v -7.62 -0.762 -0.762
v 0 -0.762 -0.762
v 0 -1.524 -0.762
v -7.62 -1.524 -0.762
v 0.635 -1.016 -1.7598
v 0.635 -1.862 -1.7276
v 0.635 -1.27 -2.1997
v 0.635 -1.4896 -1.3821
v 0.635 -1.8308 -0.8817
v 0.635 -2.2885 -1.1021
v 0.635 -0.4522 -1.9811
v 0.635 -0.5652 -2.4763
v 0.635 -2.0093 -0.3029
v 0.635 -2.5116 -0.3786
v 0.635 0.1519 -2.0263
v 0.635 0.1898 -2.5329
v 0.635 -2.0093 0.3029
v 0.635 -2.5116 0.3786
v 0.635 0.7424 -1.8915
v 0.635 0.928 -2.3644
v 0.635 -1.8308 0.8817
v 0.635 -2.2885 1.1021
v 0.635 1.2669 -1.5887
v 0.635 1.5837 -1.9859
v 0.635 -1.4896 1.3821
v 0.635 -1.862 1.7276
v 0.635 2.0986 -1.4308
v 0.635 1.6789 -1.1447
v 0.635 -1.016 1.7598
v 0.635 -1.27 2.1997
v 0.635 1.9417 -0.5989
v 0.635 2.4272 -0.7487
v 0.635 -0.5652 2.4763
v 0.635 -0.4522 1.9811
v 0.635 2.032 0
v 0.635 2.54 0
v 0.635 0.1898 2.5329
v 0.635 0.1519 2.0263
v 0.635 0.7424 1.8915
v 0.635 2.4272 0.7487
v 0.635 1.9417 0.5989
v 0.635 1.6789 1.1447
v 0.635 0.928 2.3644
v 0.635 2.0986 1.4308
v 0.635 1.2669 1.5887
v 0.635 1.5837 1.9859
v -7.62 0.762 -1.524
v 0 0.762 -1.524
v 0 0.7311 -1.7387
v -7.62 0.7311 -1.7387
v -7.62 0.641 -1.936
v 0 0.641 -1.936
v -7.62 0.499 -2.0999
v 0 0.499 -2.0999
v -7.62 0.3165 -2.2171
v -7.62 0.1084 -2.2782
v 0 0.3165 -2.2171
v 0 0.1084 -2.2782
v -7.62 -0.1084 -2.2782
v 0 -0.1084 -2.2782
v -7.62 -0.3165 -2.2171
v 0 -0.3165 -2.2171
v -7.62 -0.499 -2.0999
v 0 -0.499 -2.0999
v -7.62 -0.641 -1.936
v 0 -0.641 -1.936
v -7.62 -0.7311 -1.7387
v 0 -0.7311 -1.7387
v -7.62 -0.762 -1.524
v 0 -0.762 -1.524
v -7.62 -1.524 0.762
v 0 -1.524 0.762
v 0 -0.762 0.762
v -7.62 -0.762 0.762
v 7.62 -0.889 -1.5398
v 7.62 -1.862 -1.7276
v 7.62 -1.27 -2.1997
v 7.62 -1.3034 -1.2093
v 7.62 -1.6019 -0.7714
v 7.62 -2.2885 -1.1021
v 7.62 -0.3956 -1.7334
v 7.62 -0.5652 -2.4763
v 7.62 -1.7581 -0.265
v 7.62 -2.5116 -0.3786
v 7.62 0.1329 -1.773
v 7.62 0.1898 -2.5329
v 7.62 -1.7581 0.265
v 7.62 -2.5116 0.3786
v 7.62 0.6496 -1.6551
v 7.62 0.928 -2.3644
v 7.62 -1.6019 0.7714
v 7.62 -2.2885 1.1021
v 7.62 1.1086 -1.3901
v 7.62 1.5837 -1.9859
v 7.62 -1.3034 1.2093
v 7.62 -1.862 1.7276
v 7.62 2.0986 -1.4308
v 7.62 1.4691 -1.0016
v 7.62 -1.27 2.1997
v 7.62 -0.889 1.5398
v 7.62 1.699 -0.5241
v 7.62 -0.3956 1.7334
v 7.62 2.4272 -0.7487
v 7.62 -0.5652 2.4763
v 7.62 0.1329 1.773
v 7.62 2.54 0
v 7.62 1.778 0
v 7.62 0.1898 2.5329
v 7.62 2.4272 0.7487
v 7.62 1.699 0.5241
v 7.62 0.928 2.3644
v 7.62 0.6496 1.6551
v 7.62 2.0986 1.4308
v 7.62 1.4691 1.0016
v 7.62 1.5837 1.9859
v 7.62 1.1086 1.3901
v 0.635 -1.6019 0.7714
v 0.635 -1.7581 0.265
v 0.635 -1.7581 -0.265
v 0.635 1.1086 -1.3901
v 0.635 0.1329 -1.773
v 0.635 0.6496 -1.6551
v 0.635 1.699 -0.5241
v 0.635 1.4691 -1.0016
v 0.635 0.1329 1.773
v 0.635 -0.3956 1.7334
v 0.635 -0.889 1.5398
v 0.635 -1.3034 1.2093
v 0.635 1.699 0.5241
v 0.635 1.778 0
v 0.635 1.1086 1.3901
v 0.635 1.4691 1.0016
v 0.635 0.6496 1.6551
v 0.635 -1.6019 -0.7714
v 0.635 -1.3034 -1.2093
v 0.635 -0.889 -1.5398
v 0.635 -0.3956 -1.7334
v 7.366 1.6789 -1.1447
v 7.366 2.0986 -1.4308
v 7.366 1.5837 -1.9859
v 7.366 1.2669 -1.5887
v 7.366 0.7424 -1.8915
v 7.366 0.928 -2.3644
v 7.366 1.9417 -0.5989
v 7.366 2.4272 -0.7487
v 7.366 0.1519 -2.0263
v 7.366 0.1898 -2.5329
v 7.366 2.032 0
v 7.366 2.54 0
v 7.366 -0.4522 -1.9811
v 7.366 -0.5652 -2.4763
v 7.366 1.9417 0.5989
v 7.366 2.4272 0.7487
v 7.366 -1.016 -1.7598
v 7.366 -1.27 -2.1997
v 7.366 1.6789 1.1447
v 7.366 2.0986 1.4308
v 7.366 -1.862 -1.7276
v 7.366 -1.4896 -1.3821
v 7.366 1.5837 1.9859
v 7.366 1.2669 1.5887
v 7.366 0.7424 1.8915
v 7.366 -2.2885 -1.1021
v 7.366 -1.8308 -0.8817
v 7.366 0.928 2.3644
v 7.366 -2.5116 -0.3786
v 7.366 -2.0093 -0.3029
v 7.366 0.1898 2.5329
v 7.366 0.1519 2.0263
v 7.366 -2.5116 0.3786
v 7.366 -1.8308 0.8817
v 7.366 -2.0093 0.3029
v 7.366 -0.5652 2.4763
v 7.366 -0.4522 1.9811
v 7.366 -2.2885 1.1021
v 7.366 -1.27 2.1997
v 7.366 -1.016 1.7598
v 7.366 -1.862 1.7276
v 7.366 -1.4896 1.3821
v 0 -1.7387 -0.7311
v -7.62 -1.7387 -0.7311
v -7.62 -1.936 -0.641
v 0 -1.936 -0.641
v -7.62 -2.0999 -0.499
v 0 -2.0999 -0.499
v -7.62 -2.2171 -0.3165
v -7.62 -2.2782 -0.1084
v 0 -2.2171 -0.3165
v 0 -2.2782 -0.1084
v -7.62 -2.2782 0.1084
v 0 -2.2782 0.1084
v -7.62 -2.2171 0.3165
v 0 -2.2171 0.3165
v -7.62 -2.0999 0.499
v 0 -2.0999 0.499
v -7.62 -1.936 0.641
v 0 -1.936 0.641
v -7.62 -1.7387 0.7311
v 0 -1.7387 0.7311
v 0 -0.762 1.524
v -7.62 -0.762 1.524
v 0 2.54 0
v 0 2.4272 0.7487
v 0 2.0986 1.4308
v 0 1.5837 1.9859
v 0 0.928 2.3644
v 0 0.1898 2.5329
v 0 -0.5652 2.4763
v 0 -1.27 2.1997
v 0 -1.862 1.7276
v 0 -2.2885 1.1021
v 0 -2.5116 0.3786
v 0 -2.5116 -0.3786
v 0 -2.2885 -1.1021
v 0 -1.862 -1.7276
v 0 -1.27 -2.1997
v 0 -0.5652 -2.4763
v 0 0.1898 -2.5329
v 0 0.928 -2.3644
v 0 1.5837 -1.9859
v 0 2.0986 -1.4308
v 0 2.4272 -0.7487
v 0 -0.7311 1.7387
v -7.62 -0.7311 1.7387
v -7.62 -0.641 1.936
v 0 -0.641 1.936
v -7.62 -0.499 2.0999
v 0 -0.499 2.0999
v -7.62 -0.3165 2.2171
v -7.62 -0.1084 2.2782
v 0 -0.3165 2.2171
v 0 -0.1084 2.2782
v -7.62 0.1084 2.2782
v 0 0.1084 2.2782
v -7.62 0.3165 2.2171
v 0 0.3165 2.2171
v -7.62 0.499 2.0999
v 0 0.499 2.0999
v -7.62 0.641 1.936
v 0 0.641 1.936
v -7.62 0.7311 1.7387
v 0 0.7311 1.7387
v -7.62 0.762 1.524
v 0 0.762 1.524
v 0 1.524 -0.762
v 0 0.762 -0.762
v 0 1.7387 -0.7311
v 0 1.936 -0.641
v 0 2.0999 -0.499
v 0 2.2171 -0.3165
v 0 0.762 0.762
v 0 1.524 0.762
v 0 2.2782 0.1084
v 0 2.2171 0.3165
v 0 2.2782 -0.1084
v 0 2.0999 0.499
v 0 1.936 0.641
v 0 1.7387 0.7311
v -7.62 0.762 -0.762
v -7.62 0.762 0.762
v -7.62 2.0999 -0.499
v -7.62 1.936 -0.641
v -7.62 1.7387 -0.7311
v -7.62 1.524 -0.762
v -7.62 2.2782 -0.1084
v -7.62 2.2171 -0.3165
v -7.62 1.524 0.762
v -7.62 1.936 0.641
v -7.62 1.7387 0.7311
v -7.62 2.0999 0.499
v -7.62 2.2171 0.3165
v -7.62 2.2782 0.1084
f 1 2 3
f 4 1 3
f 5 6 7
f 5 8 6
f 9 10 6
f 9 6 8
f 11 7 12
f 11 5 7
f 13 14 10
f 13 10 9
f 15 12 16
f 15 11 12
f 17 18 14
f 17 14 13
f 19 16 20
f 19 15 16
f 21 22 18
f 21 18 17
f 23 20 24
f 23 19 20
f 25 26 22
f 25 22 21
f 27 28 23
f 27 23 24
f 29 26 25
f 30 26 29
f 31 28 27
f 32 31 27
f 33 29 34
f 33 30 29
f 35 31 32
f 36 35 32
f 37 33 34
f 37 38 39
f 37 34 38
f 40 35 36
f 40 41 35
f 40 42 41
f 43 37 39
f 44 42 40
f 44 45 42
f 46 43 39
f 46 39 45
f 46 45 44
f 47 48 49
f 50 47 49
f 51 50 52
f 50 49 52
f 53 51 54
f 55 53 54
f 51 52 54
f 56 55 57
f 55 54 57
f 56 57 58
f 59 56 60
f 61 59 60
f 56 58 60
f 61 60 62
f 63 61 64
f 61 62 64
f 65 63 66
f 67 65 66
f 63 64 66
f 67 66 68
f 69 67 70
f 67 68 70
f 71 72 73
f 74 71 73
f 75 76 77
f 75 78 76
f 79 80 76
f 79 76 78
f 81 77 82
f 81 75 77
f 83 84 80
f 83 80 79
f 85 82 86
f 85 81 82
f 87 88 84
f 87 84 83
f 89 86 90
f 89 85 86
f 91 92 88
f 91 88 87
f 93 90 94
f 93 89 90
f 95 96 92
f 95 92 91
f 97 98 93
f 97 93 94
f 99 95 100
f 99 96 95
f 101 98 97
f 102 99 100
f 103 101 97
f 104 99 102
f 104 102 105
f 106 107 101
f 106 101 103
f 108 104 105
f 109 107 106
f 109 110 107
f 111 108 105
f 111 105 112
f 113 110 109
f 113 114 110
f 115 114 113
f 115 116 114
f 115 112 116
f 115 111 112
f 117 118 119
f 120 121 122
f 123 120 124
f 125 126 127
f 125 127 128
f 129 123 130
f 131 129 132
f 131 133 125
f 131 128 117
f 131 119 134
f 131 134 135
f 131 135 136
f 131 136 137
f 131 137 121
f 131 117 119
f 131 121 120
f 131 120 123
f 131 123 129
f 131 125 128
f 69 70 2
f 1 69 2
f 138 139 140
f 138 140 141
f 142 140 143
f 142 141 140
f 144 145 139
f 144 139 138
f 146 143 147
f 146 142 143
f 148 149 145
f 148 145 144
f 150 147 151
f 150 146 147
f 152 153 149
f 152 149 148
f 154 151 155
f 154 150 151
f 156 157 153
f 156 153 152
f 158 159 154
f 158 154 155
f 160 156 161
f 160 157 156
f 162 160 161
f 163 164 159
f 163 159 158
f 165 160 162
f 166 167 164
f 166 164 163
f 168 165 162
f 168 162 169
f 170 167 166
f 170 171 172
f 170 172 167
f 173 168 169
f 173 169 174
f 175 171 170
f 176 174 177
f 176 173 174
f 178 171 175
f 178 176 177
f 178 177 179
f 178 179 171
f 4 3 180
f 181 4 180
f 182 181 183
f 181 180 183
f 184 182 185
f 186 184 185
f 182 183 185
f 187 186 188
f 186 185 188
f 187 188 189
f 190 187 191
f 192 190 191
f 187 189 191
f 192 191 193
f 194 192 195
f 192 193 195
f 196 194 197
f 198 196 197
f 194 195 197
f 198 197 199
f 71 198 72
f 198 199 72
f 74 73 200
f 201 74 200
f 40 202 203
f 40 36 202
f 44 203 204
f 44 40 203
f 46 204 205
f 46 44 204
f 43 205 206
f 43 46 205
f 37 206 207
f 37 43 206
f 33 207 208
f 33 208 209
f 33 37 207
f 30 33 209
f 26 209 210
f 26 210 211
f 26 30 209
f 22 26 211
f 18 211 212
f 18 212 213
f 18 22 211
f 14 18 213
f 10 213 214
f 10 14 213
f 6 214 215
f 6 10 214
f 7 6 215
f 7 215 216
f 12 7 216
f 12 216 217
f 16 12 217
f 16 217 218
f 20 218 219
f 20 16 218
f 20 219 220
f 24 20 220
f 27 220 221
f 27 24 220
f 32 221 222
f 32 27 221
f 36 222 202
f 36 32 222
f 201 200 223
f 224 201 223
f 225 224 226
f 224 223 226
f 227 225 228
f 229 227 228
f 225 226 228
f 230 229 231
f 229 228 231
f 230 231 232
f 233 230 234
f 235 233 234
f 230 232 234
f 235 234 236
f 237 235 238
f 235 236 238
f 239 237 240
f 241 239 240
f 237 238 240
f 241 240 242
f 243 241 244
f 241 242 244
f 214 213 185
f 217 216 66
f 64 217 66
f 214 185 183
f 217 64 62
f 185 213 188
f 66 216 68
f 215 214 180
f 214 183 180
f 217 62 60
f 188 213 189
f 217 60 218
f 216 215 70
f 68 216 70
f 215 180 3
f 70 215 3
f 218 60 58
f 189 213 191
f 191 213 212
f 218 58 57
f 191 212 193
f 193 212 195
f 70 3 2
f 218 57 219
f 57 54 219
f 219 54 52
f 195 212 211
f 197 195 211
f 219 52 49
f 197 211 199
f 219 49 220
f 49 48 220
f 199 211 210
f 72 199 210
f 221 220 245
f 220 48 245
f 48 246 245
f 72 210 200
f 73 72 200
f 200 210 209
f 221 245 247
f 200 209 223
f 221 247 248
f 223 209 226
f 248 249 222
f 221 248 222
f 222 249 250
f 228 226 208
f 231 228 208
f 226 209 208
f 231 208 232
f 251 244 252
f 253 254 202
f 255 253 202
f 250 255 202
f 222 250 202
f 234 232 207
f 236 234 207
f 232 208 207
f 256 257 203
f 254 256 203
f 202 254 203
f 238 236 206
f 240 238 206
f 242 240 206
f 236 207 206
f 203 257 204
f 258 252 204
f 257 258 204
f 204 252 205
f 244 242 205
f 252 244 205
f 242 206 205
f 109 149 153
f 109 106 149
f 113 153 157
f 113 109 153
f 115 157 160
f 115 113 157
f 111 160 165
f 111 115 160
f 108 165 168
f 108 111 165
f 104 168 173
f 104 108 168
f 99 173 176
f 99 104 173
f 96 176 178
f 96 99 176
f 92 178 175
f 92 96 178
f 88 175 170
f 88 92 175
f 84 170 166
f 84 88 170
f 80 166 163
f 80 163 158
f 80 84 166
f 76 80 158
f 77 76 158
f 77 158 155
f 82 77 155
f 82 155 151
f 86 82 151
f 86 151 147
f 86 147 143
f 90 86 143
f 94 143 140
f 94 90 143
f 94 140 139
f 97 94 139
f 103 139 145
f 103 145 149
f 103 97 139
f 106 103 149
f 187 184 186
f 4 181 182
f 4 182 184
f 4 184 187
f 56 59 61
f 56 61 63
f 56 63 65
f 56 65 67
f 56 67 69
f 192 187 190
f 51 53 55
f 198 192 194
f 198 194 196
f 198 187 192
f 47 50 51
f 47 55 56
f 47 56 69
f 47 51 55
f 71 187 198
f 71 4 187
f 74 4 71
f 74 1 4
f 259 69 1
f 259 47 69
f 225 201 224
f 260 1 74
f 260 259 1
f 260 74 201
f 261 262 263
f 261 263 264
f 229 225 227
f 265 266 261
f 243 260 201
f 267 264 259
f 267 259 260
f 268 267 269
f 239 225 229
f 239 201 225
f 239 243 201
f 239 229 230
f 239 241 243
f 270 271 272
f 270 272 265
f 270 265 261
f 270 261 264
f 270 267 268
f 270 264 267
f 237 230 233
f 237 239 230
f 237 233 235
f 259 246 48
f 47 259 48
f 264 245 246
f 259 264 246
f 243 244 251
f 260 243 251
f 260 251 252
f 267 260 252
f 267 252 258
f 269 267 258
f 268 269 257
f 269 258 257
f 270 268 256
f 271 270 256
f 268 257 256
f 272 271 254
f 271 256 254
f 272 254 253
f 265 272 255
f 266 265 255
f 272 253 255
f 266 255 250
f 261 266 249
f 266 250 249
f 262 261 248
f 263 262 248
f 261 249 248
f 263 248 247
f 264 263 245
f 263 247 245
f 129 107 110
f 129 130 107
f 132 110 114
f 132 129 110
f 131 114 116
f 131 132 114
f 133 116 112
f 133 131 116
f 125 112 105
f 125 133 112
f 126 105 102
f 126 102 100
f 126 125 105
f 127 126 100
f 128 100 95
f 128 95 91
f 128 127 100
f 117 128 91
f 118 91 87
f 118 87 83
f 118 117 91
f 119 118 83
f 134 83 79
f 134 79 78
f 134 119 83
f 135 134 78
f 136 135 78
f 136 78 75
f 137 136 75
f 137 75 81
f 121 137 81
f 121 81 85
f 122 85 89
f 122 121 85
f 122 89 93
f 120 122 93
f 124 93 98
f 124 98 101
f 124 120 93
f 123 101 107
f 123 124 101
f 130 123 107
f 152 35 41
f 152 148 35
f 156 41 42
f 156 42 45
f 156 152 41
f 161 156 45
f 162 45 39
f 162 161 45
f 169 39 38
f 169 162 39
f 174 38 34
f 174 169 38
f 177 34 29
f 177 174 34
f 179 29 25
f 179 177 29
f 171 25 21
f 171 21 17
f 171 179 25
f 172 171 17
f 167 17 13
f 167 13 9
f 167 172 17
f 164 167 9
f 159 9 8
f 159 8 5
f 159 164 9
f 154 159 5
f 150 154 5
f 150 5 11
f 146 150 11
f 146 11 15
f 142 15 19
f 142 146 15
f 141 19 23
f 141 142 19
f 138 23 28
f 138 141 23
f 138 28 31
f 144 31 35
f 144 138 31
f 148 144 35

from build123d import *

# Parameters (mm, degrees)
BOSS_EXTRUDE1_DEPTH = 7.62


with BuildPart() as part:
    # Sketch1 → Revolve1 (revolve)
    with BuildSketch(Plane.XY):
        Polygon((0, 1.778), (0, 2.54), (0.635, 2.54), (0.635, 2.032), (7.366, 2.032), (7.366, 2.54), (7.62, 2.54), (7.62, 1.778), (0.635, 1.778), (0.635, 0), (0, 0), align=None)
    revolve(axis=Axis((0, 0, 0), (1, 0, 0)))

    # Sketch3 → Boss-Extrude1 (add)
    with BuildSketch(Plane(origin=(0, 0, 0), x_dir=(0, 0, -1), z_dir=(1, 0, 0))):
        with BuildLine():
            Line((-1.524, 0.762), (-0.762, 0.762))
            Line((-0.762, 0.762), (-0.762, 1.524))
            ThreePointArc((-0.762, 1.524), (0, 2.286), (0.762, 1.524))
            Line((0.762, 1.524), (0.762, 0.762))
            Line((0.762, 0.762), (1.524, 0.762))
            ThreePointArc((1.524, 0.762), (2.286, 0), (1.524, -0.762))
            Line((1.524, -0.762), (0.762, -0.762))
            Line((0.762, -0.762), (0.762, -1.524))
            ThreePointArc((0.762, -1.524), (0, -2.286), (-0.762, -1.524))
            Line((-0.762, -1.524), (-0.762, -0.762))
            Line((-0.762, -0.762), (-1.524, -0.762))
            ThreePointArc((-1.524, -0.762), (-2.286, 0), (-1.524, 0.762))
        make_face()
    extrude(amount=-BOSS_EXTRUDE1_DEPTH)


solid = part.part
